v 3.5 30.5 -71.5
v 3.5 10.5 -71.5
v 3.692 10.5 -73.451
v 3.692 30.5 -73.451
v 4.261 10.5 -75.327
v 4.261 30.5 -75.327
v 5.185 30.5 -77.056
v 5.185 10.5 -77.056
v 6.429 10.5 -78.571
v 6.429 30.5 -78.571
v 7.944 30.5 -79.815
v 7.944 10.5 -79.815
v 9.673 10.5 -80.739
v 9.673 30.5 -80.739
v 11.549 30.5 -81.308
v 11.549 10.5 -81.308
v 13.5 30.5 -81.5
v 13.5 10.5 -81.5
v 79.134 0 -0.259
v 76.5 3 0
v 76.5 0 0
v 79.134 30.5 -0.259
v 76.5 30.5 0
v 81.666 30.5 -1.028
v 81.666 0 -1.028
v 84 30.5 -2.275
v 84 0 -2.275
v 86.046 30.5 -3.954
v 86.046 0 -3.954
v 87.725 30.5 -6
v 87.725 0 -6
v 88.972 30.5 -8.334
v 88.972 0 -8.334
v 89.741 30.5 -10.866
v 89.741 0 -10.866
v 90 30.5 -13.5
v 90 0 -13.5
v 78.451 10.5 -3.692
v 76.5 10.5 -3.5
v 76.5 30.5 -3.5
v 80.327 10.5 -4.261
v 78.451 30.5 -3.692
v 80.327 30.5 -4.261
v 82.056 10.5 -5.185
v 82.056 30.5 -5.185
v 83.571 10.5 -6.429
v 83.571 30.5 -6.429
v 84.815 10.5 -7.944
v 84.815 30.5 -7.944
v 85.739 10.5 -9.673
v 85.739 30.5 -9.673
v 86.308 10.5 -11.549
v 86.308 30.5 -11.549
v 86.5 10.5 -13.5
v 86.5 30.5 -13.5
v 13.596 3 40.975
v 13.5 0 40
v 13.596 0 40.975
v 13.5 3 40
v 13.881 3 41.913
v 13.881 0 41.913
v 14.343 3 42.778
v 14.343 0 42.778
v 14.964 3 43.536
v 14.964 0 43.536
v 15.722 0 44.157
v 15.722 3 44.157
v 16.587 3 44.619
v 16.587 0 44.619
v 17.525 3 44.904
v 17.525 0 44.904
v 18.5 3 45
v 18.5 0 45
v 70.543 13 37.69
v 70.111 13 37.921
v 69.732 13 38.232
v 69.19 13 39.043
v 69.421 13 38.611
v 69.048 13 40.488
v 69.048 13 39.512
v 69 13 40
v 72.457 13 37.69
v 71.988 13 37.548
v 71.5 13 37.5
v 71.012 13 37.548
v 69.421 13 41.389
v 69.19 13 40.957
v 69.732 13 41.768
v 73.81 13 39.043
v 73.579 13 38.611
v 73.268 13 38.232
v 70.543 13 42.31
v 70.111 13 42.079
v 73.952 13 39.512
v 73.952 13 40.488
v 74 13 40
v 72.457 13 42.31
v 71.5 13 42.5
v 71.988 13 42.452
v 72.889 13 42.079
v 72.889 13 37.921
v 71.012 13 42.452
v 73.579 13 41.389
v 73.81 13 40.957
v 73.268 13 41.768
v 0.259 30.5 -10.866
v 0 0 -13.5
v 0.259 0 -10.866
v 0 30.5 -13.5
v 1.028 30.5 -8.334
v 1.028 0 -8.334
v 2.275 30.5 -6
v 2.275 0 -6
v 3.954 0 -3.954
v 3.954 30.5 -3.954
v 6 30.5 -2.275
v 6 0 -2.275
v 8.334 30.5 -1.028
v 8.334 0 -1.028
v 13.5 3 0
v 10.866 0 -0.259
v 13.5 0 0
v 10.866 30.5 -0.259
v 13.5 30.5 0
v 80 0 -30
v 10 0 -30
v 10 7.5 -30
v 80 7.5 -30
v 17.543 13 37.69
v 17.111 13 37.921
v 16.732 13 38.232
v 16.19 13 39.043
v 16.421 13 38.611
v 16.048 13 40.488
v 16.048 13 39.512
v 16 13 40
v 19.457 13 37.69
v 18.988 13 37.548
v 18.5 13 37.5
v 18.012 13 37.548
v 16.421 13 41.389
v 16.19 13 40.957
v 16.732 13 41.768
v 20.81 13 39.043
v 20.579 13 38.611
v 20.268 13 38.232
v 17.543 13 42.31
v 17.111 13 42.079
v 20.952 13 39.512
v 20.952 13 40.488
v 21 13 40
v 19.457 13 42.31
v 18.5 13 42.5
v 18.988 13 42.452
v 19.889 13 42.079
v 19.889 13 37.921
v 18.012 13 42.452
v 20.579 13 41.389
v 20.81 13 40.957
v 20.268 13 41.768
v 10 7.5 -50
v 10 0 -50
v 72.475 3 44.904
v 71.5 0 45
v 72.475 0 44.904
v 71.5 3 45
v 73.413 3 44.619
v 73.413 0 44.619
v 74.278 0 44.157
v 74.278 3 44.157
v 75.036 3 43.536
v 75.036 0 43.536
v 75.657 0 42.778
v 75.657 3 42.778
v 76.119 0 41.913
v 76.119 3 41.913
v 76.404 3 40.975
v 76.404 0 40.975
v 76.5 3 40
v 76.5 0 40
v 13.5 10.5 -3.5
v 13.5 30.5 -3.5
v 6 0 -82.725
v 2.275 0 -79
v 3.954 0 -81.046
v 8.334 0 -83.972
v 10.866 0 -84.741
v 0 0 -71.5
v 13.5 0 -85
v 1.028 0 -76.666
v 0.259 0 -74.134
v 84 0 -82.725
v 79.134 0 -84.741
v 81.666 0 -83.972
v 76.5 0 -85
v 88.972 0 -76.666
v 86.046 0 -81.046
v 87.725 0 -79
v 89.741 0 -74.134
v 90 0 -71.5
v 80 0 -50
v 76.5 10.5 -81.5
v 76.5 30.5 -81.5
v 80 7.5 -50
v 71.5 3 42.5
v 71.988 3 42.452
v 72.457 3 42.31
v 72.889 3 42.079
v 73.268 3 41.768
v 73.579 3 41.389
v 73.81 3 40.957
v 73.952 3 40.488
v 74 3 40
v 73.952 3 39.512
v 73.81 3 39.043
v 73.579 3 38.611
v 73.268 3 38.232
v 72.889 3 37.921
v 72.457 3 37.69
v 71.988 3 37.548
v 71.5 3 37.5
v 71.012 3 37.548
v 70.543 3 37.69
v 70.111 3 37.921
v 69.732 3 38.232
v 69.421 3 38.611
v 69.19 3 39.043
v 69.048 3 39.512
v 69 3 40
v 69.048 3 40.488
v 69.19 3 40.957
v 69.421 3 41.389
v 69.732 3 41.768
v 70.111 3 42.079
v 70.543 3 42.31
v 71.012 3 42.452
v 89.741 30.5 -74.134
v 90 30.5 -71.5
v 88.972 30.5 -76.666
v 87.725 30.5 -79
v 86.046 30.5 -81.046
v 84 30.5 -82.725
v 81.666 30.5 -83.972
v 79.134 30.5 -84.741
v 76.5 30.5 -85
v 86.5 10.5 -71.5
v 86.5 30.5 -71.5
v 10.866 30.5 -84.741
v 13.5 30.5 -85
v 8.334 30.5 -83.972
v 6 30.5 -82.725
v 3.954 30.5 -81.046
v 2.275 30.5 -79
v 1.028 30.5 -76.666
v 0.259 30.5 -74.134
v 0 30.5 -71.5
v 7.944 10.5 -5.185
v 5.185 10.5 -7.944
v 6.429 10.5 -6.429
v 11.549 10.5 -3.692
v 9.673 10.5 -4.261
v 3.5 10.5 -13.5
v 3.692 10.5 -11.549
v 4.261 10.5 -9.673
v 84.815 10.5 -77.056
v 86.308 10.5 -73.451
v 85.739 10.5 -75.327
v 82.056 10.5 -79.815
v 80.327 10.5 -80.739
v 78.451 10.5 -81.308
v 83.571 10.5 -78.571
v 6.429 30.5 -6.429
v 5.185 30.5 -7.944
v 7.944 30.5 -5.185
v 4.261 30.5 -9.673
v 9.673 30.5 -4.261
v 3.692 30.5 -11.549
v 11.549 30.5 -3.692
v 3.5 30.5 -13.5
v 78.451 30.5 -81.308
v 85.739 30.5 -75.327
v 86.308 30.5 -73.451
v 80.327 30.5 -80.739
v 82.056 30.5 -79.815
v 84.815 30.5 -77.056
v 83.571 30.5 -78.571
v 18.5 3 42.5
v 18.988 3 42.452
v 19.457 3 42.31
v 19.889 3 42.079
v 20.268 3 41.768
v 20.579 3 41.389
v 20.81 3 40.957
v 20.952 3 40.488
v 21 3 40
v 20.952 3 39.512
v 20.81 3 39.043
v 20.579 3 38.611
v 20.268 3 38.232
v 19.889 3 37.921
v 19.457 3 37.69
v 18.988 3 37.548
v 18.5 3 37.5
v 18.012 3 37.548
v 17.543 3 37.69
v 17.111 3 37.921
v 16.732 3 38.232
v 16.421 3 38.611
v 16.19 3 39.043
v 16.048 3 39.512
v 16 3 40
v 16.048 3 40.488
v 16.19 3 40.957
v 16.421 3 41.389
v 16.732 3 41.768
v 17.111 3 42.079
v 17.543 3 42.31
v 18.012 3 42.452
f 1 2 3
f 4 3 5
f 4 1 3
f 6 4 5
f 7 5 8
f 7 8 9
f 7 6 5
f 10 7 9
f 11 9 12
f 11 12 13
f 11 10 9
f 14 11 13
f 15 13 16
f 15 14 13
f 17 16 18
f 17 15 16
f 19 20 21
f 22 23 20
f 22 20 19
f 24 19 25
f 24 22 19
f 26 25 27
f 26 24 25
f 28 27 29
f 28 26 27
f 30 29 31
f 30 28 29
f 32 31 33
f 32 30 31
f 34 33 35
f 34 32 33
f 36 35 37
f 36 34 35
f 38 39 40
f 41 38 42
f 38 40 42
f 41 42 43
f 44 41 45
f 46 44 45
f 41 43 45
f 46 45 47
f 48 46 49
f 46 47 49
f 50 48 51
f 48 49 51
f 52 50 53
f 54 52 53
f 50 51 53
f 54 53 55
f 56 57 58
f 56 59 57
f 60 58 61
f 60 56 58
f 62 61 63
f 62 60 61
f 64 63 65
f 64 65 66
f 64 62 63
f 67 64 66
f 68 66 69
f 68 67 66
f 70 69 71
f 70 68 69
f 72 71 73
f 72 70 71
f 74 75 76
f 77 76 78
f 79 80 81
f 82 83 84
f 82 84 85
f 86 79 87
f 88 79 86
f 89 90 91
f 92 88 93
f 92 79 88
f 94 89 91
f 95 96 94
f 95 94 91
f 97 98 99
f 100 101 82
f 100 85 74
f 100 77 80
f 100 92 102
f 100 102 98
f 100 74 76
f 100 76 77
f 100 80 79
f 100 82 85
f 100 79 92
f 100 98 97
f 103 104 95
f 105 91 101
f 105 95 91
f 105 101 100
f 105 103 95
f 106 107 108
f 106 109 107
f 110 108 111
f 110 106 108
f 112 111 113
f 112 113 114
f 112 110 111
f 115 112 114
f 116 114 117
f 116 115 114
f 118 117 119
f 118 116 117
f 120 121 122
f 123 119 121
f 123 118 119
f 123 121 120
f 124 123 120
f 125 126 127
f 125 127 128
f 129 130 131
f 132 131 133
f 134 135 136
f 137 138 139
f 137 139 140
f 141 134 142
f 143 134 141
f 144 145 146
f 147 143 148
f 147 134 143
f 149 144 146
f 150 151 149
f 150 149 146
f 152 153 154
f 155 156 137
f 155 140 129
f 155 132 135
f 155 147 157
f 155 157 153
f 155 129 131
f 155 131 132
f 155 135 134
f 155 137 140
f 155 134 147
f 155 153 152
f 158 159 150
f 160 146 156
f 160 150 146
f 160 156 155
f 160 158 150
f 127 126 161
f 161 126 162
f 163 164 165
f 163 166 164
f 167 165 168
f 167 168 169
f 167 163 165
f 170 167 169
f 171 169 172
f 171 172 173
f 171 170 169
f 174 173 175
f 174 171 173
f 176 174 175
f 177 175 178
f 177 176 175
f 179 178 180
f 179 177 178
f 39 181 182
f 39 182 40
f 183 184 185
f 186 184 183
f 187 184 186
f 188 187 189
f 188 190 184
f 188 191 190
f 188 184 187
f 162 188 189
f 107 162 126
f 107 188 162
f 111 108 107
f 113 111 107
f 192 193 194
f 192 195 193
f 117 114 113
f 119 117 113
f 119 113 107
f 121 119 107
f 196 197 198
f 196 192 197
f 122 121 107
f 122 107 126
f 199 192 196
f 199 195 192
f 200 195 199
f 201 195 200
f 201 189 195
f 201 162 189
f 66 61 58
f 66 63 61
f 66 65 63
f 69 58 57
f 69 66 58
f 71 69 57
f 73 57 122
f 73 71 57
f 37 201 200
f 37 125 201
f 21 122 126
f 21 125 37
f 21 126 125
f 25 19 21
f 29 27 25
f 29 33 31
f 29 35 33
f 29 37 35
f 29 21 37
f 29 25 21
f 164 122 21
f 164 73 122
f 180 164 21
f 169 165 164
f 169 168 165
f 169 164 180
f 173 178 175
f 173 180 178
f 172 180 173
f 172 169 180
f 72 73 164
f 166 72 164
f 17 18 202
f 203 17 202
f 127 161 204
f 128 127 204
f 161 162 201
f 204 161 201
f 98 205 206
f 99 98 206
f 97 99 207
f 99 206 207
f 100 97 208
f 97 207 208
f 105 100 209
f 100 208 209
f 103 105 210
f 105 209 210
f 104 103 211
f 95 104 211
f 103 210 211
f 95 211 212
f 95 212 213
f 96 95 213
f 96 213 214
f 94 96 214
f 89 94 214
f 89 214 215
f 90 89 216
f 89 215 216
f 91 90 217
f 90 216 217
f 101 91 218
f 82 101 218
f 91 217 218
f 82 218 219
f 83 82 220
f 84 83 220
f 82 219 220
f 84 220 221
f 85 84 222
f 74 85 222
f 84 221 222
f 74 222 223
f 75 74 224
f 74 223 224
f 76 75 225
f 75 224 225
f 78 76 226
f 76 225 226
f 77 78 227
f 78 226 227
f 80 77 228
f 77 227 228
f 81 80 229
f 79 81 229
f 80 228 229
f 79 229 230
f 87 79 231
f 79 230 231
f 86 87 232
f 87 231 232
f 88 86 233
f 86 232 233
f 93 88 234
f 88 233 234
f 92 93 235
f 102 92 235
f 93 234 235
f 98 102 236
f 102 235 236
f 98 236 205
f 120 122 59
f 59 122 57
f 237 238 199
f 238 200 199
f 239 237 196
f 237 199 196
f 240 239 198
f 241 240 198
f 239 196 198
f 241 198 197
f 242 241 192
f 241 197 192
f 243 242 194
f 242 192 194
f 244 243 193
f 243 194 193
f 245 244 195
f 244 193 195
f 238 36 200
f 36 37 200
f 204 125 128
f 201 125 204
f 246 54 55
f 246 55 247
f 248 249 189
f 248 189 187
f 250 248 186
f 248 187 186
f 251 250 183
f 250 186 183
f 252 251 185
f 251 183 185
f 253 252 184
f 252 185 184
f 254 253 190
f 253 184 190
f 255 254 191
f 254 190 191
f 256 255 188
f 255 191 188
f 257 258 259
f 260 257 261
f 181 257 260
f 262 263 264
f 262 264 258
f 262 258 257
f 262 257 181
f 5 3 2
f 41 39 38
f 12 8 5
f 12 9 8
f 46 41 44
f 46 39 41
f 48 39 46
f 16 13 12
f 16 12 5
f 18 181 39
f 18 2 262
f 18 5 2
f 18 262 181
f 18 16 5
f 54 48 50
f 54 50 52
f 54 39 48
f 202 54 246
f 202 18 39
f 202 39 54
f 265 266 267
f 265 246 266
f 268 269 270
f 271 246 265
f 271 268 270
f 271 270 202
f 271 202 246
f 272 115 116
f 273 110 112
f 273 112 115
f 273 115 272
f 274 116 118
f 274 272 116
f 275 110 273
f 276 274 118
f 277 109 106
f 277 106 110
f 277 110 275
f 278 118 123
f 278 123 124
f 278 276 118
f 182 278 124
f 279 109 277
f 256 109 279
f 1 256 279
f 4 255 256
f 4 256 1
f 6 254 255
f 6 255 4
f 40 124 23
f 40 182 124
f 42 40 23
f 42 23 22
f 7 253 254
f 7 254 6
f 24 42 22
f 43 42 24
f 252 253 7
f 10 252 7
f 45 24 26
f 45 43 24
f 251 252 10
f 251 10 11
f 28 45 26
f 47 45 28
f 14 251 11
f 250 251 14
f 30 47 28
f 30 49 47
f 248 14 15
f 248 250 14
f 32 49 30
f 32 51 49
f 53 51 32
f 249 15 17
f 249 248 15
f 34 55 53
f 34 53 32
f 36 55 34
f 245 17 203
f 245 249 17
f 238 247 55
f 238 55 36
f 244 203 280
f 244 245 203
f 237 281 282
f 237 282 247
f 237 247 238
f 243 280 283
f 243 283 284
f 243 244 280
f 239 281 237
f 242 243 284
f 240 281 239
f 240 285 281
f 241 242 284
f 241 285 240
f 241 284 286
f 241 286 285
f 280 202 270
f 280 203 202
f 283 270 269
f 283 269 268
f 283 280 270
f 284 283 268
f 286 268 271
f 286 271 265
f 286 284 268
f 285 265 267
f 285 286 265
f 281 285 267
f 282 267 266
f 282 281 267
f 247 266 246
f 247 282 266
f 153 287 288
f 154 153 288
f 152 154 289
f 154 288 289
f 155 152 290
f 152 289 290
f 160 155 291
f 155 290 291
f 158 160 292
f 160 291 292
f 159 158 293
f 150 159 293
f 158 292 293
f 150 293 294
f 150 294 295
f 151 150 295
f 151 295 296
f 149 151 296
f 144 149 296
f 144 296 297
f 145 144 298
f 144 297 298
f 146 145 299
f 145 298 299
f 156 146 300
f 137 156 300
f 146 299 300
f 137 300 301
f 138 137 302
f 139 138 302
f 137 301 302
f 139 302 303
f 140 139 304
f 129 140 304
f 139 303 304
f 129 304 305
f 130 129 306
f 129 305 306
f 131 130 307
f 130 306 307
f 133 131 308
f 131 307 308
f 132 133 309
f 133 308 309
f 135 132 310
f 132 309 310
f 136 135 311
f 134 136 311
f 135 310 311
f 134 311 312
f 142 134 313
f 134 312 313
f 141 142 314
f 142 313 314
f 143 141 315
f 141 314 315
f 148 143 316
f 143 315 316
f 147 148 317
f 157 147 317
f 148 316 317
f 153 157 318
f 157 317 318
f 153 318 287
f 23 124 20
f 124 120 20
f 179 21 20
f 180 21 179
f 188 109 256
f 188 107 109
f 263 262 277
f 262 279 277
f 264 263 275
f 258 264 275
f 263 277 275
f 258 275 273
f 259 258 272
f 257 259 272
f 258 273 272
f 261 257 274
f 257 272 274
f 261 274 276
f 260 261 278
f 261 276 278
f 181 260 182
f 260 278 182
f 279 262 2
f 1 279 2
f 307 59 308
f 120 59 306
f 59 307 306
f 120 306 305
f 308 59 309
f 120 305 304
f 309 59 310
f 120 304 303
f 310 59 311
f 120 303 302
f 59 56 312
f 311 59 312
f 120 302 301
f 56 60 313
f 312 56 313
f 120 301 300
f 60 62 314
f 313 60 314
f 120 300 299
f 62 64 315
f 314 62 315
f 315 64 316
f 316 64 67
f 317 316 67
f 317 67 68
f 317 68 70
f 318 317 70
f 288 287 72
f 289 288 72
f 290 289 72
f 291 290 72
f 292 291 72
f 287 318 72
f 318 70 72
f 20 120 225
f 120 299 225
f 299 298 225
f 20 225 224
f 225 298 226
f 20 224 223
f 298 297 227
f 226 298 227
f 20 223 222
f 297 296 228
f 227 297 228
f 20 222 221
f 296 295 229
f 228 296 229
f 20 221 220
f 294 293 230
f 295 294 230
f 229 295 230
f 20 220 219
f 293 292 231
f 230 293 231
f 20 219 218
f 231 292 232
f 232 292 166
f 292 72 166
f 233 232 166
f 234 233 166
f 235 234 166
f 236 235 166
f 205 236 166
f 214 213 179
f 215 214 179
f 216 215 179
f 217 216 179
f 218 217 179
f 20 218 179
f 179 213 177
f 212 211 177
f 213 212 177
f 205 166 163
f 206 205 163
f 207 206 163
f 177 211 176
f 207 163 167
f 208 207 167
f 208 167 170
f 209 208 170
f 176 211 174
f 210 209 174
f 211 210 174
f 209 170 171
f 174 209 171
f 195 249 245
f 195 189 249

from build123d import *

# Parameters (mm, degrees)
SKETCH1_W           = 90
SKETCH1_H           = 85
SKETCH1_W_2         = 70
SKETCH1_H_2         = 20
BOSS_EXTRUDE1_DEPTH = 7.5
SKETCH2_W           = 90
SKETCH2_H           = 85
BOSS_EXTRUDE2_DEPTH = 3
SKETCH3_W           = 90
SKETCH3_H           = 85
SKETCH3_W_2         = 83
SKETCH3_H_2         = 78
BOSS_EXTRUDE3_DEPTH = 20
FILLET1_R           = 10
FILLET3_R           = 10
FILLET4_R           = 10
FILLET5_R           = 10
FILLET7_R           = 13.5
FILLET8_R           = 13.5
FILLET9_R           = 13.5
FILLET10_R          = 13.5
SKETCH4_W           = 63
SKETCH4_H           = 45
BOSS_EXTRUDE4_DEPTH = 3
FILLET15_R          = 5
FILLET16_R          = 5
SKETCH7_R           = 2.5
BOSS_EXTRUDE6_DEPTH = 10


with BuildPart() as part:
    # Sketch1 → Boss-Extrude1 (new body)
    with BuildSketch(Plane(origin=(0, 0, 0), x_dir=(1, 0, 0), z_dir=(0, 1, 0))):
        with Locations((45, 42.5)):
            Rectangle(SKETCH1_W, SKETCH1_H)
        with Locations((45, 40)):
            Rectangle(SKETCH1_W_2, SKETCH1_H_2, mode=Mode.SUBTRACT)
    extrude(amount=BOSS_EXTRUDE1_DEPTH)

    # Sketch2 → Boss-Extrude2 (add)
    with BuildSketch(Plane(origin=(0, 7.5, 0), x_dir=(1, 0, 0), z_dir=(0, 1, 0))):
        with Locations((45, 42.5)):
            Rectangle(SKETCH2_W, SKETCH2_H)
    extrude(amount=BOSS_EXTRUDE2_DEPTH)

    # Sketch3 → Boss-Extrude3 (add)
    with BuildSketch(Plane(origin=(0, 10.5, 0), x_dir=(1, 0, 0), z_dir=(0, 1, 0))):
        with Locations((45, 42.5)):
            Rectangle(SKETCH3_W, SKETCH3_H)
        with Locations((45, 42.5)):
            Rectangle(SKETCH3_W_2, SKETCH3_H_2, mode=Mode.SUBTRACT)
    extrude(amount=BOSS_EXTRUDE3_DEPTH)

    # Fillet1
    fillet1_edges = [part.edges().sort_by_distance(p)[0] for p in [
        (3.5, 20.5, -81.5),
    ]]
    fillet(fillet1_edges, radius=FILLET1_R)

    # Fillet3
    fillet3_edges = [part.edges().sort_by_distance(p)[0] for p in [
        (86.5, 20.5, -81.5),
    ]]
    fillet(fillet3_edges, radius=FILLET3_R)

    # Fillet4
    fillet4_edges = [part.edges().sort_by_distance(p)[0] for p in [
        (3.5, 20.5, -3.5),
    ]]
    fillet(fillet4_edges, radius=FILLET4_R)

    # Fillet5
    fillet5_edges = [part.edges().sort_by_distance(p)[0] for p in [
        (86.5, 20.5, -3.5),
    ]]
    fillet(fillet5_edges, radius=FILLET5_R)

    # Fillet7
    fillet7_edges = [part.edges().sort_by_distance(p)[0] for p in [
        (0, 15.25, 0),
    ]]
    fillet(fillet7_edges, radius=FILLET7_R)

    # Fillet8
    fillet8_edges = [part.edges().sort_by_distance(p)[0] for p in [
        (90, 15.25, 0),
    ]]
    fillet(fillet8_edges, radius=FILLET8_R)

    # Fillet9
    fillet9_edges = [part.edges().sort_by_distance(p)[0] for p in [
        (90, 15.25, -85),
    ]]
    fillet(fillet9_edges, radius=FILLET9_R)

    # Fillet10
    fillet10_edges = [part.edges().sort_by_distance(p)[0] for p in [
        (0, 15.25, -85),
    ]]
    fillet(fillet10_edges, radius=FILLET10_R)

    # Sketch4 → Boss-Extrude4 (add)
    with BuildSketch(Plane.XZ):
        with Locations((45, 22.5)):
            Rectangle(SKETCH4_W, SKETCH4_H)
    extrude(amount=-BOSS_EXTRUDE4_DEPTH)

    # Fillet15
    fillet15_edges = [part.edges().sort_by_distance(p)[0] for p in [
        (13.5, 1.5, 45),
    ]]
    fillet(fillet15_edges, radius=FILLET15_R)

    # Fillet16
    fillet16_edges = [part.edges().sort_by_distance(p)[0] for p in [
        (76.5, 1.5, 45),
    ]]
    fillet(fillet16_edges, radius=FILLET16_R)

    # Sketch7 → Boss-Extrude6 (add)
    with BuildSketch(Plane(origin=(0, 3, 0), x_dir=(1, 0, 0), z_dir=(0, 1, 0))):
        with Locations(Location((18.5, -40, 0), (0, 0, 270))):
            Circle(SKETCH7_R)
        with Locations(Location((71.5, -40, 0), (0, 0, 270))):
            Circle(SKETCH7_R)
    extrude(amount=BOSS_EXTRUDE6_DEPTH)


solid = part.part
